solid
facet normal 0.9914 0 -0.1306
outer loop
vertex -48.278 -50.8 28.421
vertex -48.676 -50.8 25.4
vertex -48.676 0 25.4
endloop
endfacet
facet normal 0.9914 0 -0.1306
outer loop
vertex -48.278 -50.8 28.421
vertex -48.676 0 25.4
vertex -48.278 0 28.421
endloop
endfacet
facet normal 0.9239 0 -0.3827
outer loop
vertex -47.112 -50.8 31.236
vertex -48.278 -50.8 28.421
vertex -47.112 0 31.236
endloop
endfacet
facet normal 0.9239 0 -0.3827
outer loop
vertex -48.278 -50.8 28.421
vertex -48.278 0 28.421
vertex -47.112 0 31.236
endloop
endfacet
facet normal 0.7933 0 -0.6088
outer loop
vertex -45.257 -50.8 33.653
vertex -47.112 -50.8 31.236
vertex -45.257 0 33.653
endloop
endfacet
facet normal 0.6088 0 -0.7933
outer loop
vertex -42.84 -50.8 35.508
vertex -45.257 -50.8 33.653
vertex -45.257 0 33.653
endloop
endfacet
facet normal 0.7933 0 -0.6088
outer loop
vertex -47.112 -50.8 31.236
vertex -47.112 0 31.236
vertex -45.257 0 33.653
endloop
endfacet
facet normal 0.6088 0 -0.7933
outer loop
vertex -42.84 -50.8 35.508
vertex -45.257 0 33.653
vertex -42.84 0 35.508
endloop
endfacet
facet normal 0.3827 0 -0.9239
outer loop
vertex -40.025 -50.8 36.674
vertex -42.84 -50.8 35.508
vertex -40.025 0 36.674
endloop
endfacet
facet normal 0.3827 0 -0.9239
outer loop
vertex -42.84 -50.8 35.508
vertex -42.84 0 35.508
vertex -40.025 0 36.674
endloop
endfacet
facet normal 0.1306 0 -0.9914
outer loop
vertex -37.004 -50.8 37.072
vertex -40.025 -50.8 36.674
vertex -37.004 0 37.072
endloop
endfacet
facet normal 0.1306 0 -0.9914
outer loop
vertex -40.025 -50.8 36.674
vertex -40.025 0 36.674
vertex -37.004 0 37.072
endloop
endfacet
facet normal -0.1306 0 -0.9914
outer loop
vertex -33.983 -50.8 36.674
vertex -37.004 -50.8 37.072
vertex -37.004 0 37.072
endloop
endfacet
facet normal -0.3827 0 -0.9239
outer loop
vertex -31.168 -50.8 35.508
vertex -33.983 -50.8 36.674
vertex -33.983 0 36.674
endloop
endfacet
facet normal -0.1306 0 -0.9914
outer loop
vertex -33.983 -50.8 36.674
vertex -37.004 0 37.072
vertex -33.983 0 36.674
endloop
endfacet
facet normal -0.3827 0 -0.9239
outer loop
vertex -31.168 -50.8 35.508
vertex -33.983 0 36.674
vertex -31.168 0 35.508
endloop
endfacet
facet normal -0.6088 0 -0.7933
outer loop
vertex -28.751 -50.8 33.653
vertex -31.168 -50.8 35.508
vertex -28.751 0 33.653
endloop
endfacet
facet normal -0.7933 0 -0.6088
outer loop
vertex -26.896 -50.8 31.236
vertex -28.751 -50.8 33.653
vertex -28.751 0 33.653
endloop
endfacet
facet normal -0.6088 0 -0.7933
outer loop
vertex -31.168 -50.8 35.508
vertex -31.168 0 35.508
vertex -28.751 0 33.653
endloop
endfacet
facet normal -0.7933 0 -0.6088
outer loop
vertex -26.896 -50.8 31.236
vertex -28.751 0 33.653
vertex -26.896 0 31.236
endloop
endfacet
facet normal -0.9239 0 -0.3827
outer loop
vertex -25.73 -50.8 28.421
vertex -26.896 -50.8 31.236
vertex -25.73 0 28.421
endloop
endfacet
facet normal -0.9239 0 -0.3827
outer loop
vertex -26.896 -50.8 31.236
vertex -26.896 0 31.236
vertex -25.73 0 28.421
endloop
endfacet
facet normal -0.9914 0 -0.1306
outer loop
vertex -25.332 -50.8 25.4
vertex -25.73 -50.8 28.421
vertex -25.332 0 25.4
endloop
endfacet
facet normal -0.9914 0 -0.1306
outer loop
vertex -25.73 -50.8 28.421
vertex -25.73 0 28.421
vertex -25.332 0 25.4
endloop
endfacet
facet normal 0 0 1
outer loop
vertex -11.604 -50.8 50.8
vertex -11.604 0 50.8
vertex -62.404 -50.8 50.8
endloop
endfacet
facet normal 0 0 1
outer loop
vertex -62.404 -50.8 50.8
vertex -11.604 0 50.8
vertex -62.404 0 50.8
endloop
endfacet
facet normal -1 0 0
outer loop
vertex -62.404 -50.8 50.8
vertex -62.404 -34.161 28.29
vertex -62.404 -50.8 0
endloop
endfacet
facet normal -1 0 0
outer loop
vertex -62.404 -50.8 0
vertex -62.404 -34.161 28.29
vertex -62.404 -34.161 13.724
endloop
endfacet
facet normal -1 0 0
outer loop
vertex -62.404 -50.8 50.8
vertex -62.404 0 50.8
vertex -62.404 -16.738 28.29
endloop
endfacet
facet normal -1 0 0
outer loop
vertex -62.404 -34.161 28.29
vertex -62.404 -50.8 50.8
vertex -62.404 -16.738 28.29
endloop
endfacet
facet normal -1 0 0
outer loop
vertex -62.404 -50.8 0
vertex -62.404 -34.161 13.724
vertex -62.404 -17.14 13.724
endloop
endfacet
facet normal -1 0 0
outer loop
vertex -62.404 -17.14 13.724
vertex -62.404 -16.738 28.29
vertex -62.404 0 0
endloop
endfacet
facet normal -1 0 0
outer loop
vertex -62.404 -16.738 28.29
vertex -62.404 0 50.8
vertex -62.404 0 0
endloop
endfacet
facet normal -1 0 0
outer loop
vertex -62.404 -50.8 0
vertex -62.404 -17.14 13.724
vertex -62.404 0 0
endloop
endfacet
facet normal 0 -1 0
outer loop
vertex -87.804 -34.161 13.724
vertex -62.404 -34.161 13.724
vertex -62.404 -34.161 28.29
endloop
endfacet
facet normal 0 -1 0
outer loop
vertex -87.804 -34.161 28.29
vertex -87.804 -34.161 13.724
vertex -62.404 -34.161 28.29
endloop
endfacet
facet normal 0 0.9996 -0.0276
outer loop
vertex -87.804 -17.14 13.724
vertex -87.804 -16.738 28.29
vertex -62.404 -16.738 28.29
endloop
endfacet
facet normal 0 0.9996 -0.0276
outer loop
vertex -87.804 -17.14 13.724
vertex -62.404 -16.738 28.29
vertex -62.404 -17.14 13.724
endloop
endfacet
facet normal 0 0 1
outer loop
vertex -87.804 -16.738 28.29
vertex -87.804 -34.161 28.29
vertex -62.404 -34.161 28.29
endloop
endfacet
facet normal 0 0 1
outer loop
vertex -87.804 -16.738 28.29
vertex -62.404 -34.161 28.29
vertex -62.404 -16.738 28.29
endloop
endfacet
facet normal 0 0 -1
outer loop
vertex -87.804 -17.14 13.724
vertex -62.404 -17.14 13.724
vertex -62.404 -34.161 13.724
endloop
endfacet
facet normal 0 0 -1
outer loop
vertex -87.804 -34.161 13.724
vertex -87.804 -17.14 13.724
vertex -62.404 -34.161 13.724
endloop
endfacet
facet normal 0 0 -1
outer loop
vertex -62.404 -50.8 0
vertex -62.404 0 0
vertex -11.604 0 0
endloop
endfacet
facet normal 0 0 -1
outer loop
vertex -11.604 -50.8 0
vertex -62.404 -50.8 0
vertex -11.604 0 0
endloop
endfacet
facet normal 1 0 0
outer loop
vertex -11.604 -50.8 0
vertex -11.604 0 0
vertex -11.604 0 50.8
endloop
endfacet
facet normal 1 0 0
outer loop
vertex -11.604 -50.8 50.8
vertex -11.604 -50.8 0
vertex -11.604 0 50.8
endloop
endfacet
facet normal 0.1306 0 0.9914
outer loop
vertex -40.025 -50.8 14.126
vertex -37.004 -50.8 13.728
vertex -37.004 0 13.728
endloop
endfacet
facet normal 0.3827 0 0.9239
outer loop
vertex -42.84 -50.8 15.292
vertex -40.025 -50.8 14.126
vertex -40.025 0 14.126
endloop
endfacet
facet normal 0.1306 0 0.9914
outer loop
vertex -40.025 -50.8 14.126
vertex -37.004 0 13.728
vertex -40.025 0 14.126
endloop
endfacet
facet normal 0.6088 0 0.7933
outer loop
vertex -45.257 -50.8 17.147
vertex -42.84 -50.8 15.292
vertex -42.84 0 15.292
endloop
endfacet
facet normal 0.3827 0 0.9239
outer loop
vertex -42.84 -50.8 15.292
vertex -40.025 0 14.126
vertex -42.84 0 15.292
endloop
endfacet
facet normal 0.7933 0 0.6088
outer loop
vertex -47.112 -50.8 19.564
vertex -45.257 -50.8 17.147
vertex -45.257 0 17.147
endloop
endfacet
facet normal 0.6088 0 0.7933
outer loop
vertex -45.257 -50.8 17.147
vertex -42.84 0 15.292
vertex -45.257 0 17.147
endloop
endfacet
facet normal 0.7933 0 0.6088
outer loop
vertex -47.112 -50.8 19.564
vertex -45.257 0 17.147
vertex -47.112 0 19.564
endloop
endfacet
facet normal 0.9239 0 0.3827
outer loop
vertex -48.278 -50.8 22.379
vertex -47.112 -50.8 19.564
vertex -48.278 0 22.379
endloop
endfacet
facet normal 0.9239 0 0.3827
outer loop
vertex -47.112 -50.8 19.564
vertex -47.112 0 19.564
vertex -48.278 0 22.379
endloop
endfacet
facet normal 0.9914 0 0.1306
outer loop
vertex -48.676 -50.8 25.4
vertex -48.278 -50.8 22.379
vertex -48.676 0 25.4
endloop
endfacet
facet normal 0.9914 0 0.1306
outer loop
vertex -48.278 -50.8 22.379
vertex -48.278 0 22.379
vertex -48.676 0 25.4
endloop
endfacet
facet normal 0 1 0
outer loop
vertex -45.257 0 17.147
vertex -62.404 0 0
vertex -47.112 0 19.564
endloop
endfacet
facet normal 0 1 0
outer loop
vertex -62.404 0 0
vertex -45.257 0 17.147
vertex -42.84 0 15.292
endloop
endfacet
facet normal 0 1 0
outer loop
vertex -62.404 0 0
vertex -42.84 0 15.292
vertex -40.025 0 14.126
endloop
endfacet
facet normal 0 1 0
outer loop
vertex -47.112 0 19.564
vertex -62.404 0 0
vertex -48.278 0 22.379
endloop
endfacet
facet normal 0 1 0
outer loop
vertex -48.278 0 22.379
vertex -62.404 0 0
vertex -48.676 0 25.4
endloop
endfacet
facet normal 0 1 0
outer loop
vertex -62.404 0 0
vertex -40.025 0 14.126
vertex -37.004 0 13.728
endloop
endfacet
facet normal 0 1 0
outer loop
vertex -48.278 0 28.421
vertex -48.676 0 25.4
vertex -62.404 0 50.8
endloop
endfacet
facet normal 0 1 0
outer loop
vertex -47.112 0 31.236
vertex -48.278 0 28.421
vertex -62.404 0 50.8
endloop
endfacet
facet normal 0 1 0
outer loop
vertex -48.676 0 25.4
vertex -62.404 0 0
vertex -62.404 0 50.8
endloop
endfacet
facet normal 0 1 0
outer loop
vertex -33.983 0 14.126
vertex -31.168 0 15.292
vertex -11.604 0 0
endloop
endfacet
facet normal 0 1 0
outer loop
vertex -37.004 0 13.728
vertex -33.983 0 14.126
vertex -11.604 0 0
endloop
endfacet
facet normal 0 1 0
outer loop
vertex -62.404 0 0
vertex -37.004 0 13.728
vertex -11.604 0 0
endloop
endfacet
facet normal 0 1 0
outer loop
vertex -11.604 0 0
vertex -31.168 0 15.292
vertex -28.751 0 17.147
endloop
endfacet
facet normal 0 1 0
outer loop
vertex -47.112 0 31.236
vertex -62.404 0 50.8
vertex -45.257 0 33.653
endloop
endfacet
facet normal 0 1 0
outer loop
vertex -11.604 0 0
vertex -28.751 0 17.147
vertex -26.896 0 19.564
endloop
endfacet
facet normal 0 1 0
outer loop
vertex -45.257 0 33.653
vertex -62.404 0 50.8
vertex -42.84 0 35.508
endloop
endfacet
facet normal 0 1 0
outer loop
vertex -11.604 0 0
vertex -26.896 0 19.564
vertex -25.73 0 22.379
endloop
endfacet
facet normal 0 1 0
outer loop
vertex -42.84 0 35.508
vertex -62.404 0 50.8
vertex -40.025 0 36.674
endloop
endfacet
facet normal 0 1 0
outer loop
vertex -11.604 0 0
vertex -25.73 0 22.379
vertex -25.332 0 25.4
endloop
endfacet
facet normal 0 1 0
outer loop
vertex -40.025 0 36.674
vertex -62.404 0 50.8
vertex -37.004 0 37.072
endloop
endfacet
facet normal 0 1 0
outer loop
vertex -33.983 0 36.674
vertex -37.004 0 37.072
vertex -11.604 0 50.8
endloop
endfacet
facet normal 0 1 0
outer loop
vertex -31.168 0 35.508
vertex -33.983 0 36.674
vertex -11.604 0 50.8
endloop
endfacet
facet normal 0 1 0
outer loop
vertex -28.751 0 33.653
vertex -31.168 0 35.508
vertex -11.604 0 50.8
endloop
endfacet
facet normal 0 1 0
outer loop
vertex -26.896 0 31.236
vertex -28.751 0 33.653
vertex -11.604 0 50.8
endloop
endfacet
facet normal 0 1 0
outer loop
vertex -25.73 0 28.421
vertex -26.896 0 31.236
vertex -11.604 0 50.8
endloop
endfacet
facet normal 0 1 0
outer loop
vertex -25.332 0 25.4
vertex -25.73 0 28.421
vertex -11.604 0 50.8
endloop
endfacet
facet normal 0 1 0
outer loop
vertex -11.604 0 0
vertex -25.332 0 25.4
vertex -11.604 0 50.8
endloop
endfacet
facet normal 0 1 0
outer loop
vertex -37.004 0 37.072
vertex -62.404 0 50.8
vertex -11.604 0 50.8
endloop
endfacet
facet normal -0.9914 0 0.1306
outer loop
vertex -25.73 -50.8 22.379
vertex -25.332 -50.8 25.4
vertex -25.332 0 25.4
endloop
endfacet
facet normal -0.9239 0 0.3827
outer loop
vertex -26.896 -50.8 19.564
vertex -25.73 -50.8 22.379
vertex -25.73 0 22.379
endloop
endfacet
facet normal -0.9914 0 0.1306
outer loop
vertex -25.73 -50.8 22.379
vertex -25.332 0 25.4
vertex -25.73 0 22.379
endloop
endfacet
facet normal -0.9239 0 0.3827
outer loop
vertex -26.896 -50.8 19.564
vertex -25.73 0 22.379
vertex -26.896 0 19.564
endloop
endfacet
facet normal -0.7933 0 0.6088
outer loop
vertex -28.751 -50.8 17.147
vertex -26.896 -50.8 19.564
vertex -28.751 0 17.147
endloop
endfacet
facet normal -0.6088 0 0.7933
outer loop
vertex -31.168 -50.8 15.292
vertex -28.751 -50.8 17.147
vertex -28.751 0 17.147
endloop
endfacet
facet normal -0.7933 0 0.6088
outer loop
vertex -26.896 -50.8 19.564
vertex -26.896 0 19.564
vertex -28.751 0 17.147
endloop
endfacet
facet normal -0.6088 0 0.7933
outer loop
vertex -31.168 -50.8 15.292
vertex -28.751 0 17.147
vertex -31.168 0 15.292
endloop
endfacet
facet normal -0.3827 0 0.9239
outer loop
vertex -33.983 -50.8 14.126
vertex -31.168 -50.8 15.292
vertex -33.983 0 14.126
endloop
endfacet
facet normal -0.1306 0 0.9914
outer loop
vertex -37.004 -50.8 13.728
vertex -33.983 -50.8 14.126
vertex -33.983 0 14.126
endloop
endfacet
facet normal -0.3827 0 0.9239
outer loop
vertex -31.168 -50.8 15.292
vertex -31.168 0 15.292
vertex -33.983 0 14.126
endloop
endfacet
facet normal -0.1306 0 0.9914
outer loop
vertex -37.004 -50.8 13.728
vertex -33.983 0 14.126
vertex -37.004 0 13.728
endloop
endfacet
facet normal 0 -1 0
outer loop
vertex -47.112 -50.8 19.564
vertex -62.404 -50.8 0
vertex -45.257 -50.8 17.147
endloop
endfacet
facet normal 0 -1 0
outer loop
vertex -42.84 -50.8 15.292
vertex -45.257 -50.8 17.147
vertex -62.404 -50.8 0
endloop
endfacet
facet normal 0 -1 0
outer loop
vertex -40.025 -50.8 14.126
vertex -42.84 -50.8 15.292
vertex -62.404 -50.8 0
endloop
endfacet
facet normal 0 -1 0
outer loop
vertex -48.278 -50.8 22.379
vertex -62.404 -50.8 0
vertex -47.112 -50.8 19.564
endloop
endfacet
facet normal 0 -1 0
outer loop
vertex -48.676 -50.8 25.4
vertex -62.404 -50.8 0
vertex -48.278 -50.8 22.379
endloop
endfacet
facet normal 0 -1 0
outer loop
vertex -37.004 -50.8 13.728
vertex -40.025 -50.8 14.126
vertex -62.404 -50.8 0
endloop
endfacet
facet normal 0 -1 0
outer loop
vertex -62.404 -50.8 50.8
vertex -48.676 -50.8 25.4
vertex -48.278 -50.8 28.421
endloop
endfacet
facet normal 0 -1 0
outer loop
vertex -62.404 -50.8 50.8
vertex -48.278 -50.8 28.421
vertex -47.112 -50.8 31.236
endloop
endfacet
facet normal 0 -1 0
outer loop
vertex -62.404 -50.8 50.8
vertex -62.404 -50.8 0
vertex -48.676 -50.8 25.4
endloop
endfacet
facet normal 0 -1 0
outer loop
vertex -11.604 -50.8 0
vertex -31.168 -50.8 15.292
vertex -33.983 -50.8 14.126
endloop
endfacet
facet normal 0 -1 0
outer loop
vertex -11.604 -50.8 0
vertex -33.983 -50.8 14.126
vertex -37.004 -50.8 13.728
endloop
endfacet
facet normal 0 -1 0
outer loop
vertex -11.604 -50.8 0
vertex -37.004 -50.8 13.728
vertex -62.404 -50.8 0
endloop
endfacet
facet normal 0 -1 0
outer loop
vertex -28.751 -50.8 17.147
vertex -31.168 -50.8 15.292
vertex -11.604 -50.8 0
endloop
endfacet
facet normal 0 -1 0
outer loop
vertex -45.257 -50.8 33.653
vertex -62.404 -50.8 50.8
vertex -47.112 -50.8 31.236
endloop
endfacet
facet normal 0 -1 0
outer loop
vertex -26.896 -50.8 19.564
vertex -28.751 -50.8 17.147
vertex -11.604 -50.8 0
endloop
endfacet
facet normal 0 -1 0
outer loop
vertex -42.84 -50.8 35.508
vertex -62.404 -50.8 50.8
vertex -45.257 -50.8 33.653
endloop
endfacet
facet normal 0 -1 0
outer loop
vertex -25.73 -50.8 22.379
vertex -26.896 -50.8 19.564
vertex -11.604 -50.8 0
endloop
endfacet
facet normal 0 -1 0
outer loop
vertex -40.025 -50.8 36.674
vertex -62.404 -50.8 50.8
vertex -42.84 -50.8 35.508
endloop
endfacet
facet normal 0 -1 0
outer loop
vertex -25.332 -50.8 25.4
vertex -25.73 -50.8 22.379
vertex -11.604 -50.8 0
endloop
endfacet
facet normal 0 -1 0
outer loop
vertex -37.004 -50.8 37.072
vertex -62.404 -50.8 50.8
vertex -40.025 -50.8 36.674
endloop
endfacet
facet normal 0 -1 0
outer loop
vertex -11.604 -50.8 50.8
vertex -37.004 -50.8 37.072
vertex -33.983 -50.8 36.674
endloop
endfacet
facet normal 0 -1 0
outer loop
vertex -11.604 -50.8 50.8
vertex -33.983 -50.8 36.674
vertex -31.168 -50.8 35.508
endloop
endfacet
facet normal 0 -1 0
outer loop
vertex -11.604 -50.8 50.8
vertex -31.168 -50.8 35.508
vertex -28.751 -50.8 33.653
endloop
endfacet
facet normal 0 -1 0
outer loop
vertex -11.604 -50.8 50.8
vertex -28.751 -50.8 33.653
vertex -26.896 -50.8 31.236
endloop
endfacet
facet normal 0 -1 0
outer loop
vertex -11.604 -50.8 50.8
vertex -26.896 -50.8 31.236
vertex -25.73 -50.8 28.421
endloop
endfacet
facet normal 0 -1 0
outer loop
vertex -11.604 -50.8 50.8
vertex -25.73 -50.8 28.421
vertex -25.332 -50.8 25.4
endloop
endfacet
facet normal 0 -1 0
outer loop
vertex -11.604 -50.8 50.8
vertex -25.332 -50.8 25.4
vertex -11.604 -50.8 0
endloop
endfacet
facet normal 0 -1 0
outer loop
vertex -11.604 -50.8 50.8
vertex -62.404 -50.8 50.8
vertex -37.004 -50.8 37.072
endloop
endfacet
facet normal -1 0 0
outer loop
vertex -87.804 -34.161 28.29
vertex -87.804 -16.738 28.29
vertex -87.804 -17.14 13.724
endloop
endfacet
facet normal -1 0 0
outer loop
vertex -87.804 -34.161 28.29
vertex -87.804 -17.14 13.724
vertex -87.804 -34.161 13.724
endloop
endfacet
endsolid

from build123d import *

# Parameters (mm, degrees)
F1_DEPTH = 50.8
F3_DEPTH = 25.4


# Not quite as in the source:
# - a feature names something its author has since deleted; it is built from what else it names


with BuildPart() as f1:
    # F0 (on Front) → F1 (new body)
    with BuildSketch(Plane.XZ):
        with BuildLine():
            Line((-37.0038875103, 50.8), (-62.4038875103, 50.8))
            Line((-62.4038875103, 50.8), (-62.4038875103, 25.4))
            Line((-62.4038875103, 25.4), (-48.6759059699, 25.4))
            ThreePointArc((-48.6759059699, 25.4), (-45.2572509132, 33.6533634029), (-37.0038875103, 37.0720184596))
            Line((-37.0038875103, 37.0720184596), (-37.0038875103, 50.8))
        make_face()
        with BuildLine():
            Line((-48.6759059699, 25.4), (-62.4038875103, 25.4))
            Line((-62.4038875103, 25.4), (-62.4038875103, 0))
            Line((-62.4038875103, 0), (-37.0038875103, 0))
            Line((-37.0038875103, 0), (-37.0038875103, 13.7279815404))
            ThreePointArc((-37.0038875103, 13.7279815404), (-45.2572509132, 17.1466365971), (-48.6759059699, 25.4))
        make_face()
        with BuildLine():
            Line((-11.6038875103, 50.8), (-37.0038875103, 50.8))
            Line((-37.0038875103, 50.8), (-37.0038875103, 37.0720184596))
            ThreePointArc((-37.0038875103, 37.0720184596), (-28.7505241074, 33.6533634029), (-25.3318690507, 25.4))
            Line((-25.3318690507, 25.4), (-11.6038875103, 25.4))
            Line((-11.6038875103, 25.4), (-11.6038875103, 50.8))
        make_face()
        with BuildLine():
            Line((-37.0038875103, 13.7279815404), (-37.0038875103, 0))
            Line((-37.0038875103, 0), (-11.6038875103, 0))
            Line((-11.6038875103, 0), (-11.6038875103, 25.4))
            Line((-11.6038875103, 25.4), (-25.3318690507, 25.4))
            ThreePointArc((-25.3318690507, 25.4), (-28.7505241074, 17.1466365971), (-37.0038875103, 13.7279815404))
        make_face()
    extrude(amount=F1_DEPTH)

    # F2 (on face) → F3 (join)
    with BuildSketch(Plane(origin=(-62.4038875103, 0, 0), x_dir=(0, -1, 0), z_dir=(-1, 0, 0))):
        Polygon((16.7379435152, 28.2901115716), (17.1399507672, 13.7242572382), (34.1606251895, 13.7242572382), (34.1606251895, 28.2901115716), align=None)
    extrude(amount=F3_DEPTH)


solid = f1.part
